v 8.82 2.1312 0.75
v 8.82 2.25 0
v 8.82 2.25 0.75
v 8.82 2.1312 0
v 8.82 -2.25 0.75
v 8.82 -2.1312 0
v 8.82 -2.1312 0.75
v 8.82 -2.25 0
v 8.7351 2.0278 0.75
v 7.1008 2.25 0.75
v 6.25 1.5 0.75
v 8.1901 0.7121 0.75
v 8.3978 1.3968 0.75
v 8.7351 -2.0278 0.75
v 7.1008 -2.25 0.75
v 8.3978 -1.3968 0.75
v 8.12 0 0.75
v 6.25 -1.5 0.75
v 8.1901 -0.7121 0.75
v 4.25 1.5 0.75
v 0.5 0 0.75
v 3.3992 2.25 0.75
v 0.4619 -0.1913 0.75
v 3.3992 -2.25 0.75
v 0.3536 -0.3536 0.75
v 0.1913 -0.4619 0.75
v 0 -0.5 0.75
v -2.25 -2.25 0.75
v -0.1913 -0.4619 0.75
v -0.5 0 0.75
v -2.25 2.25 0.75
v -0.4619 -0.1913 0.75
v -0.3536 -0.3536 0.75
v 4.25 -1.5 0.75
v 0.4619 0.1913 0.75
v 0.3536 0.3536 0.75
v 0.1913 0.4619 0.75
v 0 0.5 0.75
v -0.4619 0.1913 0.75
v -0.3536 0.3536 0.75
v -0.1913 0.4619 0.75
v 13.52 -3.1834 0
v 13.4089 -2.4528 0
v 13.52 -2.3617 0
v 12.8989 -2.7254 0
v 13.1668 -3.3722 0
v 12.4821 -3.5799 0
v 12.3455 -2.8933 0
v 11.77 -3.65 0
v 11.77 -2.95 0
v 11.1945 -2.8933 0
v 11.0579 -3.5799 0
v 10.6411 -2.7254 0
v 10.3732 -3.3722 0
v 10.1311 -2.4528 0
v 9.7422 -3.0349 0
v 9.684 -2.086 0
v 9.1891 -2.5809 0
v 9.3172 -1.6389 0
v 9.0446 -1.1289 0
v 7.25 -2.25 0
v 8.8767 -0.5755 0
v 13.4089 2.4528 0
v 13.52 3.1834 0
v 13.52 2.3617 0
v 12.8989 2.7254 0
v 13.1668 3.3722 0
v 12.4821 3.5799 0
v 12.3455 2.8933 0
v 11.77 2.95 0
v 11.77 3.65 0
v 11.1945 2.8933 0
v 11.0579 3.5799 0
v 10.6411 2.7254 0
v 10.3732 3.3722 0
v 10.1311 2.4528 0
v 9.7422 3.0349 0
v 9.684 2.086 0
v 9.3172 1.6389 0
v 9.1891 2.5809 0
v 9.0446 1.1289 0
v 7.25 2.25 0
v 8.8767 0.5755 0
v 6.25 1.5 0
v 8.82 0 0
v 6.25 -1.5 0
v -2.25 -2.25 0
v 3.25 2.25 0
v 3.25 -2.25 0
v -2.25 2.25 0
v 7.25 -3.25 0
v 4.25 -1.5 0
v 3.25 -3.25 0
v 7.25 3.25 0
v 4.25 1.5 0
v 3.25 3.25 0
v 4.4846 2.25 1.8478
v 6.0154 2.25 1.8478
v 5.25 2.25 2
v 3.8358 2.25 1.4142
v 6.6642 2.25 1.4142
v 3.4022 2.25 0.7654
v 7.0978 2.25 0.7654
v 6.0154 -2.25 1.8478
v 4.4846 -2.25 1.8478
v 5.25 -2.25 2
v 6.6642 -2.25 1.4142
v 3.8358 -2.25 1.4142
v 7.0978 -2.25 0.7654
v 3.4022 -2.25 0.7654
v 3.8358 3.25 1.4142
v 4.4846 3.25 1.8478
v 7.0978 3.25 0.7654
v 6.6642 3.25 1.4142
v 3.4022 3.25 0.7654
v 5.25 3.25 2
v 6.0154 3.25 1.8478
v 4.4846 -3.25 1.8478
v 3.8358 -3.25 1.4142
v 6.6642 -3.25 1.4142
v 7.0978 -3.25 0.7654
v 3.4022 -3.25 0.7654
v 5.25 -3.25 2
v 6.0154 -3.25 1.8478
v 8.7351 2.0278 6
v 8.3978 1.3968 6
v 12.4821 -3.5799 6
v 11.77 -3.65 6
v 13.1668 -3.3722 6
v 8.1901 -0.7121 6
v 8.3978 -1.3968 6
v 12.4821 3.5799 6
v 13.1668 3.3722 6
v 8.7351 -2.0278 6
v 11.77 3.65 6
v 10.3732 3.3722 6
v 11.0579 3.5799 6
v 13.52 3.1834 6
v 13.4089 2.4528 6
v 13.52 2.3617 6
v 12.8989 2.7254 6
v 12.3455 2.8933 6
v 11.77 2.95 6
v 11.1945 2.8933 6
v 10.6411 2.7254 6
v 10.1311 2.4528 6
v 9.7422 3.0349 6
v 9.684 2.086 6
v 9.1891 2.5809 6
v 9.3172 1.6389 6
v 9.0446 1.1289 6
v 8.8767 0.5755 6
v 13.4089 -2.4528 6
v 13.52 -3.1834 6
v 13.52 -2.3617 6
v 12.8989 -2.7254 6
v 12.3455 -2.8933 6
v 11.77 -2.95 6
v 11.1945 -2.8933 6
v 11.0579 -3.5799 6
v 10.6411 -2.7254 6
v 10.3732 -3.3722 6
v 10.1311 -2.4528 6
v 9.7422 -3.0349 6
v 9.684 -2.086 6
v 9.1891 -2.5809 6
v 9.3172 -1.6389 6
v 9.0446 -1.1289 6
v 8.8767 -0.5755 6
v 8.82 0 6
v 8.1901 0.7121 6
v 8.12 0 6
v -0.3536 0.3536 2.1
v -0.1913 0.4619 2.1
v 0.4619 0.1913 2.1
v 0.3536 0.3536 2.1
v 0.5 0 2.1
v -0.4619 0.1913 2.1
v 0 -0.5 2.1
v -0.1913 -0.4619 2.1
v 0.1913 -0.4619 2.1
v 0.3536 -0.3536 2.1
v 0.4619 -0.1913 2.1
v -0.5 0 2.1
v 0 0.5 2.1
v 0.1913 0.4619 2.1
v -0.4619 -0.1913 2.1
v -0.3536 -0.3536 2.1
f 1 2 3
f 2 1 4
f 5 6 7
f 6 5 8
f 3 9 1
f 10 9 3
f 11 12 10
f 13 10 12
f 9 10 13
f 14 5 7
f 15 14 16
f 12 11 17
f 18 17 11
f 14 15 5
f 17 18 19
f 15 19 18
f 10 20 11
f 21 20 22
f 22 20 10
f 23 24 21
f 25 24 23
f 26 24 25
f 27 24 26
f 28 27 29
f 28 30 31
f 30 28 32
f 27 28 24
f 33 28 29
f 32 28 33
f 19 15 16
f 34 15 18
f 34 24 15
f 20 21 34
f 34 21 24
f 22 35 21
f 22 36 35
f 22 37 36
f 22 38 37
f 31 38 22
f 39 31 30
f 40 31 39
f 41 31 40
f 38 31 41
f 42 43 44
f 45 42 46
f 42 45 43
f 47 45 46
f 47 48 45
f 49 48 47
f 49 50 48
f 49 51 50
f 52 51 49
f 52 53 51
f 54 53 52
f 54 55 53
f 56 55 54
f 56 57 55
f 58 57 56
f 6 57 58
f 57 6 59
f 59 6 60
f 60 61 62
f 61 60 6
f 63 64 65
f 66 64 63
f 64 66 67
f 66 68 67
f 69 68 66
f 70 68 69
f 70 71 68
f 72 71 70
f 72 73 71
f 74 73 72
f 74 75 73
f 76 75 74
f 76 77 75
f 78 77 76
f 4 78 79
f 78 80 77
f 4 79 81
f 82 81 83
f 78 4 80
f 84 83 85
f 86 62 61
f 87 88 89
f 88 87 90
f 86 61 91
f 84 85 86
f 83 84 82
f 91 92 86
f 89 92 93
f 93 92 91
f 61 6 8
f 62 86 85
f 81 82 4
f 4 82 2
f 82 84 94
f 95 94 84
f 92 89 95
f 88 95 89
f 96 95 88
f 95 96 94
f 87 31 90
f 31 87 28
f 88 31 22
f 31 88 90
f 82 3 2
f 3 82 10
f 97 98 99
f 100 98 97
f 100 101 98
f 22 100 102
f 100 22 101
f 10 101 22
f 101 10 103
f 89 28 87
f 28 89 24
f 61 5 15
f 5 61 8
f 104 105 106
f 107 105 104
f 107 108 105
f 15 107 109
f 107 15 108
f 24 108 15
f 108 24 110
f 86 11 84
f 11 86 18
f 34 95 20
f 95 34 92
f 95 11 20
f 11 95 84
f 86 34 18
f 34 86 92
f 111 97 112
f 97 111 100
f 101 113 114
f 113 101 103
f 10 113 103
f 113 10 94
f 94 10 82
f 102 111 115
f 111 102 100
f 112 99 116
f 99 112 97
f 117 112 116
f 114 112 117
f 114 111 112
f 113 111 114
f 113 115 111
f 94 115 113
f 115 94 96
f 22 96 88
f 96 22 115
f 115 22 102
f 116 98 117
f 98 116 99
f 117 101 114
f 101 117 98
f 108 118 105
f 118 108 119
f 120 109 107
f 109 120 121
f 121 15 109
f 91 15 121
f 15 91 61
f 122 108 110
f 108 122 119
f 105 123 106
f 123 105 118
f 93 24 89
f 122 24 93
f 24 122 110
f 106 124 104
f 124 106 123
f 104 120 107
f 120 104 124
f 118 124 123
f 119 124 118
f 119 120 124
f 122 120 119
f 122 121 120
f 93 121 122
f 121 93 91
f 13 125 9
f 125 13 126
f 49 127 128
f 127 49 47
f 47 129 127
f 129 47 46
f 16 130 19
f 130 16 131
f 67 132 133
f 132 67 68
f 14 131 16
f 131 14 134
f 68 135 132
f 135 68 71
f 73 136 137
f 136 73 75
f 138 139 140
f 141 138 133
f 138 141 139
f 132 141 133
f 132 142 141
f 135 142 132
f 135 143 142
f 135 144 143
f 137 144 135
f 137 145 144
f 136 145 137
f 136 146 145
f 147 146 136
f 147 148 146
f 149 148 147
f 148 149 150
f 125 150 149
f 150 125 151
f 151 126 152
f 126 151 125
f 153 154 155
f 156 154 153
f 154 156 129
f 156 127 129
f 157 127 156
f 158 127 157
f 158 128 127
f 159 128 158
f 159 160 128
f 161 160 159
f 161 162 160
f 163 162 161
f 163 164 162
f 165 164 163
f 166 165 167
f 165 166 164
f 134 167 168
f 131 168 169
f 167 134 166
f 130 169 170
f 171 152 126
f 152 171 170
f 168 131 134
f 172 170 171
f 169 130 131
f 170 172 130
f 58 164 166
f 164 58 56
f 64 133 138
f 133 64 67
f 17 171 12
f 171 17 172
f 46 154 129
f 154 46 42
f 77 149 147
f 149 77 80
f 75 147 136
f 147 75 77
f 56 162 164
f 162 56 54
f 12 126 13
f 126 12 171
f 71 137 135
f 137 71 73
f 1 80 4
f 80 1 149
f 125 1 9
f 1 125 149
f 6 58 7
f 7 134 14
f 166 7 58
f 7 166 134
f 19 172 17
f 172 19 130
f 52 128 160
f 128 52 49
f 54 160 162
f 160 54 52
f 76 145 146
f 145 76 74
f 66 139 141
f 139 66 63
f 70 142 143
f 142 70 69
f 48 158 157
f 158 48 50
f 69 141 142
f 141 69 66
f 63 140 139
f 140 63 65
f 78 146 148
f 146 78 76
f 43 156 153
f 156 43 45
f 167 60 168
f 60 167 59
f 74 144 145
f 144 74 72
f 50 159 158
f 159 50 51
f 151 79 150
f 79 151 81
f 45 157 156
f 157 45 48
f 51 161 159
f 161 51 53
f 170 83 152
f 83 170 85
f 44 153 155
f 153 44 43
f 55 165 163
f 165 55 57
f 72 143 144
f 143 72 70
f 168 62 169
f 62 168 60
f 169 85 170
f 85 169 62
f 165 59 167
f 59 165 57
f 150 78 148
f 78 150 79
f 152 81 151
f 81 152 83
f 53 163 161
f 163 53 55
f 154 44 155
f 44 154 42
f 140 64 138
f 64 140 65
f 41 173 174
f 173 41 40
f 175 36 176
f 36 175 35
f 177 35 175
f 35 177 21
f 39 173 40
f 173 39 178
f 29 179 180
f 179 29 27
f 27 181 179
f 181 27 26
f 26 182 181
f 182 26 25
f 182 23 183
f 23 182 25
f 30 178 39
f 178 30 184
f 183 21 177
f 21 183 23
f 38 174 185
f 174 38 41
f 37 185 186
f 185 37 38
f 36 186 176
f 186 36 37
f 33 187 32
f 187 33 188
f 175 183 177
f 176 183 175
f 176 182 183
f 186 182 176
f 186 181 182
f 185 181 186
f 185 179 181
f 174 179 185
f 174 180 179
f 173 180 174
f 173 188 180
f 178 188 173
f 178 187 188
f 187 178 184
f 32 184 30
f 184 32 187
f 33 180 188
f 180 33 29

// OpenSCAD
dist_hole_edge = 6.12;
dist_additional = 2.0;

//@ToDo: Rename hole -> pin or so
hole_diameter = 1;
hole_height = 2.1;

pin_height = 0.5;
slit_size_x = 5;
slit_size_y = 0.3;

plate_height = 0.75;
motor_diameter=5.9;

smd_led_size_x = 2.0;
smd_led_size_y = 3;
smd_offset_x = 5.25;

side_reinforcement_width = 1.0;

motor_clamp_thickness = 0.7;
motor_clamp_height = 6.0;

width = 4.5;


// Base plate with removed smd led rectangle
module BasePlate(){
  difference(){
    translate([-width/2,-width/2]) cube([width/2+ dist_hole_edge + dist_additional + motor_clamp_thickness,width,plate_height]);
    translate([smd_offset_x-smd_led_size_x/2,-smd_led_size_y/2,-0.5]) cube([smd_led_size_x,smd_led_size_y,10.0]);
  }
}

// Side reinforcement. Half circle to strengthen sides around SMD LED hole
module SideReinforcement(){
  intersection(){
    rotate([90,0,0]) cylinder(r=smd_led_size_x,h=side_reinforcement_width,$fn=16);
    translate([0,0,smd_led_size_x]) cube([smd_led_size_x*2, smd_led_size_x*2, smd_led_size_x*2], center = true);
  }
}

module FrameHolePin()
{
  cylinder(r=hole_diameter/2,h=hole_height,$fn=16);
}

// Clip is too filigrane, doesnt print well. Keeping it for anyone interested
module FrameHolePinTopClip()
{
  difference(){
    translate([0,0,hole_height])  cylinder(r1=(hole_diameter/2)*1.00, r2=(hole_diameter/2)*1.65,h=pin_height,$fn=16);
    translate([0,0,hole_height+pin_height])  cube([slit_size_x, slit_size_y, pin_height*2], center = true);
  }
}



FrameHolePin();
//FrameHolePinTopClip();


BasePlate();

//Add side reinforcement at LED hole
translate([smd_offset_x,width/2+side_reinforcement_width,0]) SideReinforcement();
translate([smd_offset_x,-width/2,0]) SideReinforcement();




translate([dist_hole_edge + dist_additional +motor_diameter/2+motor_clamp_thickness ,0])
difference(){  
  difference(){
    cylinder(r=motor_diameter/2+motor_clamp_thickness,h=motor_clamp_height,$fn=32);
    translate([0,0,-0.1]) cylinder(r=motor_diameter/2,h=motor_clamp_height*1.5,$fn=32);
  }
  //translate(0, 10, 0) cube(20, 200, 20);
  translate([1.75,-motor_diameter*2,-motor_diameter*2]) cube(motor_diameter*4, motor_diameter*4, motor_diameter*4);

}
